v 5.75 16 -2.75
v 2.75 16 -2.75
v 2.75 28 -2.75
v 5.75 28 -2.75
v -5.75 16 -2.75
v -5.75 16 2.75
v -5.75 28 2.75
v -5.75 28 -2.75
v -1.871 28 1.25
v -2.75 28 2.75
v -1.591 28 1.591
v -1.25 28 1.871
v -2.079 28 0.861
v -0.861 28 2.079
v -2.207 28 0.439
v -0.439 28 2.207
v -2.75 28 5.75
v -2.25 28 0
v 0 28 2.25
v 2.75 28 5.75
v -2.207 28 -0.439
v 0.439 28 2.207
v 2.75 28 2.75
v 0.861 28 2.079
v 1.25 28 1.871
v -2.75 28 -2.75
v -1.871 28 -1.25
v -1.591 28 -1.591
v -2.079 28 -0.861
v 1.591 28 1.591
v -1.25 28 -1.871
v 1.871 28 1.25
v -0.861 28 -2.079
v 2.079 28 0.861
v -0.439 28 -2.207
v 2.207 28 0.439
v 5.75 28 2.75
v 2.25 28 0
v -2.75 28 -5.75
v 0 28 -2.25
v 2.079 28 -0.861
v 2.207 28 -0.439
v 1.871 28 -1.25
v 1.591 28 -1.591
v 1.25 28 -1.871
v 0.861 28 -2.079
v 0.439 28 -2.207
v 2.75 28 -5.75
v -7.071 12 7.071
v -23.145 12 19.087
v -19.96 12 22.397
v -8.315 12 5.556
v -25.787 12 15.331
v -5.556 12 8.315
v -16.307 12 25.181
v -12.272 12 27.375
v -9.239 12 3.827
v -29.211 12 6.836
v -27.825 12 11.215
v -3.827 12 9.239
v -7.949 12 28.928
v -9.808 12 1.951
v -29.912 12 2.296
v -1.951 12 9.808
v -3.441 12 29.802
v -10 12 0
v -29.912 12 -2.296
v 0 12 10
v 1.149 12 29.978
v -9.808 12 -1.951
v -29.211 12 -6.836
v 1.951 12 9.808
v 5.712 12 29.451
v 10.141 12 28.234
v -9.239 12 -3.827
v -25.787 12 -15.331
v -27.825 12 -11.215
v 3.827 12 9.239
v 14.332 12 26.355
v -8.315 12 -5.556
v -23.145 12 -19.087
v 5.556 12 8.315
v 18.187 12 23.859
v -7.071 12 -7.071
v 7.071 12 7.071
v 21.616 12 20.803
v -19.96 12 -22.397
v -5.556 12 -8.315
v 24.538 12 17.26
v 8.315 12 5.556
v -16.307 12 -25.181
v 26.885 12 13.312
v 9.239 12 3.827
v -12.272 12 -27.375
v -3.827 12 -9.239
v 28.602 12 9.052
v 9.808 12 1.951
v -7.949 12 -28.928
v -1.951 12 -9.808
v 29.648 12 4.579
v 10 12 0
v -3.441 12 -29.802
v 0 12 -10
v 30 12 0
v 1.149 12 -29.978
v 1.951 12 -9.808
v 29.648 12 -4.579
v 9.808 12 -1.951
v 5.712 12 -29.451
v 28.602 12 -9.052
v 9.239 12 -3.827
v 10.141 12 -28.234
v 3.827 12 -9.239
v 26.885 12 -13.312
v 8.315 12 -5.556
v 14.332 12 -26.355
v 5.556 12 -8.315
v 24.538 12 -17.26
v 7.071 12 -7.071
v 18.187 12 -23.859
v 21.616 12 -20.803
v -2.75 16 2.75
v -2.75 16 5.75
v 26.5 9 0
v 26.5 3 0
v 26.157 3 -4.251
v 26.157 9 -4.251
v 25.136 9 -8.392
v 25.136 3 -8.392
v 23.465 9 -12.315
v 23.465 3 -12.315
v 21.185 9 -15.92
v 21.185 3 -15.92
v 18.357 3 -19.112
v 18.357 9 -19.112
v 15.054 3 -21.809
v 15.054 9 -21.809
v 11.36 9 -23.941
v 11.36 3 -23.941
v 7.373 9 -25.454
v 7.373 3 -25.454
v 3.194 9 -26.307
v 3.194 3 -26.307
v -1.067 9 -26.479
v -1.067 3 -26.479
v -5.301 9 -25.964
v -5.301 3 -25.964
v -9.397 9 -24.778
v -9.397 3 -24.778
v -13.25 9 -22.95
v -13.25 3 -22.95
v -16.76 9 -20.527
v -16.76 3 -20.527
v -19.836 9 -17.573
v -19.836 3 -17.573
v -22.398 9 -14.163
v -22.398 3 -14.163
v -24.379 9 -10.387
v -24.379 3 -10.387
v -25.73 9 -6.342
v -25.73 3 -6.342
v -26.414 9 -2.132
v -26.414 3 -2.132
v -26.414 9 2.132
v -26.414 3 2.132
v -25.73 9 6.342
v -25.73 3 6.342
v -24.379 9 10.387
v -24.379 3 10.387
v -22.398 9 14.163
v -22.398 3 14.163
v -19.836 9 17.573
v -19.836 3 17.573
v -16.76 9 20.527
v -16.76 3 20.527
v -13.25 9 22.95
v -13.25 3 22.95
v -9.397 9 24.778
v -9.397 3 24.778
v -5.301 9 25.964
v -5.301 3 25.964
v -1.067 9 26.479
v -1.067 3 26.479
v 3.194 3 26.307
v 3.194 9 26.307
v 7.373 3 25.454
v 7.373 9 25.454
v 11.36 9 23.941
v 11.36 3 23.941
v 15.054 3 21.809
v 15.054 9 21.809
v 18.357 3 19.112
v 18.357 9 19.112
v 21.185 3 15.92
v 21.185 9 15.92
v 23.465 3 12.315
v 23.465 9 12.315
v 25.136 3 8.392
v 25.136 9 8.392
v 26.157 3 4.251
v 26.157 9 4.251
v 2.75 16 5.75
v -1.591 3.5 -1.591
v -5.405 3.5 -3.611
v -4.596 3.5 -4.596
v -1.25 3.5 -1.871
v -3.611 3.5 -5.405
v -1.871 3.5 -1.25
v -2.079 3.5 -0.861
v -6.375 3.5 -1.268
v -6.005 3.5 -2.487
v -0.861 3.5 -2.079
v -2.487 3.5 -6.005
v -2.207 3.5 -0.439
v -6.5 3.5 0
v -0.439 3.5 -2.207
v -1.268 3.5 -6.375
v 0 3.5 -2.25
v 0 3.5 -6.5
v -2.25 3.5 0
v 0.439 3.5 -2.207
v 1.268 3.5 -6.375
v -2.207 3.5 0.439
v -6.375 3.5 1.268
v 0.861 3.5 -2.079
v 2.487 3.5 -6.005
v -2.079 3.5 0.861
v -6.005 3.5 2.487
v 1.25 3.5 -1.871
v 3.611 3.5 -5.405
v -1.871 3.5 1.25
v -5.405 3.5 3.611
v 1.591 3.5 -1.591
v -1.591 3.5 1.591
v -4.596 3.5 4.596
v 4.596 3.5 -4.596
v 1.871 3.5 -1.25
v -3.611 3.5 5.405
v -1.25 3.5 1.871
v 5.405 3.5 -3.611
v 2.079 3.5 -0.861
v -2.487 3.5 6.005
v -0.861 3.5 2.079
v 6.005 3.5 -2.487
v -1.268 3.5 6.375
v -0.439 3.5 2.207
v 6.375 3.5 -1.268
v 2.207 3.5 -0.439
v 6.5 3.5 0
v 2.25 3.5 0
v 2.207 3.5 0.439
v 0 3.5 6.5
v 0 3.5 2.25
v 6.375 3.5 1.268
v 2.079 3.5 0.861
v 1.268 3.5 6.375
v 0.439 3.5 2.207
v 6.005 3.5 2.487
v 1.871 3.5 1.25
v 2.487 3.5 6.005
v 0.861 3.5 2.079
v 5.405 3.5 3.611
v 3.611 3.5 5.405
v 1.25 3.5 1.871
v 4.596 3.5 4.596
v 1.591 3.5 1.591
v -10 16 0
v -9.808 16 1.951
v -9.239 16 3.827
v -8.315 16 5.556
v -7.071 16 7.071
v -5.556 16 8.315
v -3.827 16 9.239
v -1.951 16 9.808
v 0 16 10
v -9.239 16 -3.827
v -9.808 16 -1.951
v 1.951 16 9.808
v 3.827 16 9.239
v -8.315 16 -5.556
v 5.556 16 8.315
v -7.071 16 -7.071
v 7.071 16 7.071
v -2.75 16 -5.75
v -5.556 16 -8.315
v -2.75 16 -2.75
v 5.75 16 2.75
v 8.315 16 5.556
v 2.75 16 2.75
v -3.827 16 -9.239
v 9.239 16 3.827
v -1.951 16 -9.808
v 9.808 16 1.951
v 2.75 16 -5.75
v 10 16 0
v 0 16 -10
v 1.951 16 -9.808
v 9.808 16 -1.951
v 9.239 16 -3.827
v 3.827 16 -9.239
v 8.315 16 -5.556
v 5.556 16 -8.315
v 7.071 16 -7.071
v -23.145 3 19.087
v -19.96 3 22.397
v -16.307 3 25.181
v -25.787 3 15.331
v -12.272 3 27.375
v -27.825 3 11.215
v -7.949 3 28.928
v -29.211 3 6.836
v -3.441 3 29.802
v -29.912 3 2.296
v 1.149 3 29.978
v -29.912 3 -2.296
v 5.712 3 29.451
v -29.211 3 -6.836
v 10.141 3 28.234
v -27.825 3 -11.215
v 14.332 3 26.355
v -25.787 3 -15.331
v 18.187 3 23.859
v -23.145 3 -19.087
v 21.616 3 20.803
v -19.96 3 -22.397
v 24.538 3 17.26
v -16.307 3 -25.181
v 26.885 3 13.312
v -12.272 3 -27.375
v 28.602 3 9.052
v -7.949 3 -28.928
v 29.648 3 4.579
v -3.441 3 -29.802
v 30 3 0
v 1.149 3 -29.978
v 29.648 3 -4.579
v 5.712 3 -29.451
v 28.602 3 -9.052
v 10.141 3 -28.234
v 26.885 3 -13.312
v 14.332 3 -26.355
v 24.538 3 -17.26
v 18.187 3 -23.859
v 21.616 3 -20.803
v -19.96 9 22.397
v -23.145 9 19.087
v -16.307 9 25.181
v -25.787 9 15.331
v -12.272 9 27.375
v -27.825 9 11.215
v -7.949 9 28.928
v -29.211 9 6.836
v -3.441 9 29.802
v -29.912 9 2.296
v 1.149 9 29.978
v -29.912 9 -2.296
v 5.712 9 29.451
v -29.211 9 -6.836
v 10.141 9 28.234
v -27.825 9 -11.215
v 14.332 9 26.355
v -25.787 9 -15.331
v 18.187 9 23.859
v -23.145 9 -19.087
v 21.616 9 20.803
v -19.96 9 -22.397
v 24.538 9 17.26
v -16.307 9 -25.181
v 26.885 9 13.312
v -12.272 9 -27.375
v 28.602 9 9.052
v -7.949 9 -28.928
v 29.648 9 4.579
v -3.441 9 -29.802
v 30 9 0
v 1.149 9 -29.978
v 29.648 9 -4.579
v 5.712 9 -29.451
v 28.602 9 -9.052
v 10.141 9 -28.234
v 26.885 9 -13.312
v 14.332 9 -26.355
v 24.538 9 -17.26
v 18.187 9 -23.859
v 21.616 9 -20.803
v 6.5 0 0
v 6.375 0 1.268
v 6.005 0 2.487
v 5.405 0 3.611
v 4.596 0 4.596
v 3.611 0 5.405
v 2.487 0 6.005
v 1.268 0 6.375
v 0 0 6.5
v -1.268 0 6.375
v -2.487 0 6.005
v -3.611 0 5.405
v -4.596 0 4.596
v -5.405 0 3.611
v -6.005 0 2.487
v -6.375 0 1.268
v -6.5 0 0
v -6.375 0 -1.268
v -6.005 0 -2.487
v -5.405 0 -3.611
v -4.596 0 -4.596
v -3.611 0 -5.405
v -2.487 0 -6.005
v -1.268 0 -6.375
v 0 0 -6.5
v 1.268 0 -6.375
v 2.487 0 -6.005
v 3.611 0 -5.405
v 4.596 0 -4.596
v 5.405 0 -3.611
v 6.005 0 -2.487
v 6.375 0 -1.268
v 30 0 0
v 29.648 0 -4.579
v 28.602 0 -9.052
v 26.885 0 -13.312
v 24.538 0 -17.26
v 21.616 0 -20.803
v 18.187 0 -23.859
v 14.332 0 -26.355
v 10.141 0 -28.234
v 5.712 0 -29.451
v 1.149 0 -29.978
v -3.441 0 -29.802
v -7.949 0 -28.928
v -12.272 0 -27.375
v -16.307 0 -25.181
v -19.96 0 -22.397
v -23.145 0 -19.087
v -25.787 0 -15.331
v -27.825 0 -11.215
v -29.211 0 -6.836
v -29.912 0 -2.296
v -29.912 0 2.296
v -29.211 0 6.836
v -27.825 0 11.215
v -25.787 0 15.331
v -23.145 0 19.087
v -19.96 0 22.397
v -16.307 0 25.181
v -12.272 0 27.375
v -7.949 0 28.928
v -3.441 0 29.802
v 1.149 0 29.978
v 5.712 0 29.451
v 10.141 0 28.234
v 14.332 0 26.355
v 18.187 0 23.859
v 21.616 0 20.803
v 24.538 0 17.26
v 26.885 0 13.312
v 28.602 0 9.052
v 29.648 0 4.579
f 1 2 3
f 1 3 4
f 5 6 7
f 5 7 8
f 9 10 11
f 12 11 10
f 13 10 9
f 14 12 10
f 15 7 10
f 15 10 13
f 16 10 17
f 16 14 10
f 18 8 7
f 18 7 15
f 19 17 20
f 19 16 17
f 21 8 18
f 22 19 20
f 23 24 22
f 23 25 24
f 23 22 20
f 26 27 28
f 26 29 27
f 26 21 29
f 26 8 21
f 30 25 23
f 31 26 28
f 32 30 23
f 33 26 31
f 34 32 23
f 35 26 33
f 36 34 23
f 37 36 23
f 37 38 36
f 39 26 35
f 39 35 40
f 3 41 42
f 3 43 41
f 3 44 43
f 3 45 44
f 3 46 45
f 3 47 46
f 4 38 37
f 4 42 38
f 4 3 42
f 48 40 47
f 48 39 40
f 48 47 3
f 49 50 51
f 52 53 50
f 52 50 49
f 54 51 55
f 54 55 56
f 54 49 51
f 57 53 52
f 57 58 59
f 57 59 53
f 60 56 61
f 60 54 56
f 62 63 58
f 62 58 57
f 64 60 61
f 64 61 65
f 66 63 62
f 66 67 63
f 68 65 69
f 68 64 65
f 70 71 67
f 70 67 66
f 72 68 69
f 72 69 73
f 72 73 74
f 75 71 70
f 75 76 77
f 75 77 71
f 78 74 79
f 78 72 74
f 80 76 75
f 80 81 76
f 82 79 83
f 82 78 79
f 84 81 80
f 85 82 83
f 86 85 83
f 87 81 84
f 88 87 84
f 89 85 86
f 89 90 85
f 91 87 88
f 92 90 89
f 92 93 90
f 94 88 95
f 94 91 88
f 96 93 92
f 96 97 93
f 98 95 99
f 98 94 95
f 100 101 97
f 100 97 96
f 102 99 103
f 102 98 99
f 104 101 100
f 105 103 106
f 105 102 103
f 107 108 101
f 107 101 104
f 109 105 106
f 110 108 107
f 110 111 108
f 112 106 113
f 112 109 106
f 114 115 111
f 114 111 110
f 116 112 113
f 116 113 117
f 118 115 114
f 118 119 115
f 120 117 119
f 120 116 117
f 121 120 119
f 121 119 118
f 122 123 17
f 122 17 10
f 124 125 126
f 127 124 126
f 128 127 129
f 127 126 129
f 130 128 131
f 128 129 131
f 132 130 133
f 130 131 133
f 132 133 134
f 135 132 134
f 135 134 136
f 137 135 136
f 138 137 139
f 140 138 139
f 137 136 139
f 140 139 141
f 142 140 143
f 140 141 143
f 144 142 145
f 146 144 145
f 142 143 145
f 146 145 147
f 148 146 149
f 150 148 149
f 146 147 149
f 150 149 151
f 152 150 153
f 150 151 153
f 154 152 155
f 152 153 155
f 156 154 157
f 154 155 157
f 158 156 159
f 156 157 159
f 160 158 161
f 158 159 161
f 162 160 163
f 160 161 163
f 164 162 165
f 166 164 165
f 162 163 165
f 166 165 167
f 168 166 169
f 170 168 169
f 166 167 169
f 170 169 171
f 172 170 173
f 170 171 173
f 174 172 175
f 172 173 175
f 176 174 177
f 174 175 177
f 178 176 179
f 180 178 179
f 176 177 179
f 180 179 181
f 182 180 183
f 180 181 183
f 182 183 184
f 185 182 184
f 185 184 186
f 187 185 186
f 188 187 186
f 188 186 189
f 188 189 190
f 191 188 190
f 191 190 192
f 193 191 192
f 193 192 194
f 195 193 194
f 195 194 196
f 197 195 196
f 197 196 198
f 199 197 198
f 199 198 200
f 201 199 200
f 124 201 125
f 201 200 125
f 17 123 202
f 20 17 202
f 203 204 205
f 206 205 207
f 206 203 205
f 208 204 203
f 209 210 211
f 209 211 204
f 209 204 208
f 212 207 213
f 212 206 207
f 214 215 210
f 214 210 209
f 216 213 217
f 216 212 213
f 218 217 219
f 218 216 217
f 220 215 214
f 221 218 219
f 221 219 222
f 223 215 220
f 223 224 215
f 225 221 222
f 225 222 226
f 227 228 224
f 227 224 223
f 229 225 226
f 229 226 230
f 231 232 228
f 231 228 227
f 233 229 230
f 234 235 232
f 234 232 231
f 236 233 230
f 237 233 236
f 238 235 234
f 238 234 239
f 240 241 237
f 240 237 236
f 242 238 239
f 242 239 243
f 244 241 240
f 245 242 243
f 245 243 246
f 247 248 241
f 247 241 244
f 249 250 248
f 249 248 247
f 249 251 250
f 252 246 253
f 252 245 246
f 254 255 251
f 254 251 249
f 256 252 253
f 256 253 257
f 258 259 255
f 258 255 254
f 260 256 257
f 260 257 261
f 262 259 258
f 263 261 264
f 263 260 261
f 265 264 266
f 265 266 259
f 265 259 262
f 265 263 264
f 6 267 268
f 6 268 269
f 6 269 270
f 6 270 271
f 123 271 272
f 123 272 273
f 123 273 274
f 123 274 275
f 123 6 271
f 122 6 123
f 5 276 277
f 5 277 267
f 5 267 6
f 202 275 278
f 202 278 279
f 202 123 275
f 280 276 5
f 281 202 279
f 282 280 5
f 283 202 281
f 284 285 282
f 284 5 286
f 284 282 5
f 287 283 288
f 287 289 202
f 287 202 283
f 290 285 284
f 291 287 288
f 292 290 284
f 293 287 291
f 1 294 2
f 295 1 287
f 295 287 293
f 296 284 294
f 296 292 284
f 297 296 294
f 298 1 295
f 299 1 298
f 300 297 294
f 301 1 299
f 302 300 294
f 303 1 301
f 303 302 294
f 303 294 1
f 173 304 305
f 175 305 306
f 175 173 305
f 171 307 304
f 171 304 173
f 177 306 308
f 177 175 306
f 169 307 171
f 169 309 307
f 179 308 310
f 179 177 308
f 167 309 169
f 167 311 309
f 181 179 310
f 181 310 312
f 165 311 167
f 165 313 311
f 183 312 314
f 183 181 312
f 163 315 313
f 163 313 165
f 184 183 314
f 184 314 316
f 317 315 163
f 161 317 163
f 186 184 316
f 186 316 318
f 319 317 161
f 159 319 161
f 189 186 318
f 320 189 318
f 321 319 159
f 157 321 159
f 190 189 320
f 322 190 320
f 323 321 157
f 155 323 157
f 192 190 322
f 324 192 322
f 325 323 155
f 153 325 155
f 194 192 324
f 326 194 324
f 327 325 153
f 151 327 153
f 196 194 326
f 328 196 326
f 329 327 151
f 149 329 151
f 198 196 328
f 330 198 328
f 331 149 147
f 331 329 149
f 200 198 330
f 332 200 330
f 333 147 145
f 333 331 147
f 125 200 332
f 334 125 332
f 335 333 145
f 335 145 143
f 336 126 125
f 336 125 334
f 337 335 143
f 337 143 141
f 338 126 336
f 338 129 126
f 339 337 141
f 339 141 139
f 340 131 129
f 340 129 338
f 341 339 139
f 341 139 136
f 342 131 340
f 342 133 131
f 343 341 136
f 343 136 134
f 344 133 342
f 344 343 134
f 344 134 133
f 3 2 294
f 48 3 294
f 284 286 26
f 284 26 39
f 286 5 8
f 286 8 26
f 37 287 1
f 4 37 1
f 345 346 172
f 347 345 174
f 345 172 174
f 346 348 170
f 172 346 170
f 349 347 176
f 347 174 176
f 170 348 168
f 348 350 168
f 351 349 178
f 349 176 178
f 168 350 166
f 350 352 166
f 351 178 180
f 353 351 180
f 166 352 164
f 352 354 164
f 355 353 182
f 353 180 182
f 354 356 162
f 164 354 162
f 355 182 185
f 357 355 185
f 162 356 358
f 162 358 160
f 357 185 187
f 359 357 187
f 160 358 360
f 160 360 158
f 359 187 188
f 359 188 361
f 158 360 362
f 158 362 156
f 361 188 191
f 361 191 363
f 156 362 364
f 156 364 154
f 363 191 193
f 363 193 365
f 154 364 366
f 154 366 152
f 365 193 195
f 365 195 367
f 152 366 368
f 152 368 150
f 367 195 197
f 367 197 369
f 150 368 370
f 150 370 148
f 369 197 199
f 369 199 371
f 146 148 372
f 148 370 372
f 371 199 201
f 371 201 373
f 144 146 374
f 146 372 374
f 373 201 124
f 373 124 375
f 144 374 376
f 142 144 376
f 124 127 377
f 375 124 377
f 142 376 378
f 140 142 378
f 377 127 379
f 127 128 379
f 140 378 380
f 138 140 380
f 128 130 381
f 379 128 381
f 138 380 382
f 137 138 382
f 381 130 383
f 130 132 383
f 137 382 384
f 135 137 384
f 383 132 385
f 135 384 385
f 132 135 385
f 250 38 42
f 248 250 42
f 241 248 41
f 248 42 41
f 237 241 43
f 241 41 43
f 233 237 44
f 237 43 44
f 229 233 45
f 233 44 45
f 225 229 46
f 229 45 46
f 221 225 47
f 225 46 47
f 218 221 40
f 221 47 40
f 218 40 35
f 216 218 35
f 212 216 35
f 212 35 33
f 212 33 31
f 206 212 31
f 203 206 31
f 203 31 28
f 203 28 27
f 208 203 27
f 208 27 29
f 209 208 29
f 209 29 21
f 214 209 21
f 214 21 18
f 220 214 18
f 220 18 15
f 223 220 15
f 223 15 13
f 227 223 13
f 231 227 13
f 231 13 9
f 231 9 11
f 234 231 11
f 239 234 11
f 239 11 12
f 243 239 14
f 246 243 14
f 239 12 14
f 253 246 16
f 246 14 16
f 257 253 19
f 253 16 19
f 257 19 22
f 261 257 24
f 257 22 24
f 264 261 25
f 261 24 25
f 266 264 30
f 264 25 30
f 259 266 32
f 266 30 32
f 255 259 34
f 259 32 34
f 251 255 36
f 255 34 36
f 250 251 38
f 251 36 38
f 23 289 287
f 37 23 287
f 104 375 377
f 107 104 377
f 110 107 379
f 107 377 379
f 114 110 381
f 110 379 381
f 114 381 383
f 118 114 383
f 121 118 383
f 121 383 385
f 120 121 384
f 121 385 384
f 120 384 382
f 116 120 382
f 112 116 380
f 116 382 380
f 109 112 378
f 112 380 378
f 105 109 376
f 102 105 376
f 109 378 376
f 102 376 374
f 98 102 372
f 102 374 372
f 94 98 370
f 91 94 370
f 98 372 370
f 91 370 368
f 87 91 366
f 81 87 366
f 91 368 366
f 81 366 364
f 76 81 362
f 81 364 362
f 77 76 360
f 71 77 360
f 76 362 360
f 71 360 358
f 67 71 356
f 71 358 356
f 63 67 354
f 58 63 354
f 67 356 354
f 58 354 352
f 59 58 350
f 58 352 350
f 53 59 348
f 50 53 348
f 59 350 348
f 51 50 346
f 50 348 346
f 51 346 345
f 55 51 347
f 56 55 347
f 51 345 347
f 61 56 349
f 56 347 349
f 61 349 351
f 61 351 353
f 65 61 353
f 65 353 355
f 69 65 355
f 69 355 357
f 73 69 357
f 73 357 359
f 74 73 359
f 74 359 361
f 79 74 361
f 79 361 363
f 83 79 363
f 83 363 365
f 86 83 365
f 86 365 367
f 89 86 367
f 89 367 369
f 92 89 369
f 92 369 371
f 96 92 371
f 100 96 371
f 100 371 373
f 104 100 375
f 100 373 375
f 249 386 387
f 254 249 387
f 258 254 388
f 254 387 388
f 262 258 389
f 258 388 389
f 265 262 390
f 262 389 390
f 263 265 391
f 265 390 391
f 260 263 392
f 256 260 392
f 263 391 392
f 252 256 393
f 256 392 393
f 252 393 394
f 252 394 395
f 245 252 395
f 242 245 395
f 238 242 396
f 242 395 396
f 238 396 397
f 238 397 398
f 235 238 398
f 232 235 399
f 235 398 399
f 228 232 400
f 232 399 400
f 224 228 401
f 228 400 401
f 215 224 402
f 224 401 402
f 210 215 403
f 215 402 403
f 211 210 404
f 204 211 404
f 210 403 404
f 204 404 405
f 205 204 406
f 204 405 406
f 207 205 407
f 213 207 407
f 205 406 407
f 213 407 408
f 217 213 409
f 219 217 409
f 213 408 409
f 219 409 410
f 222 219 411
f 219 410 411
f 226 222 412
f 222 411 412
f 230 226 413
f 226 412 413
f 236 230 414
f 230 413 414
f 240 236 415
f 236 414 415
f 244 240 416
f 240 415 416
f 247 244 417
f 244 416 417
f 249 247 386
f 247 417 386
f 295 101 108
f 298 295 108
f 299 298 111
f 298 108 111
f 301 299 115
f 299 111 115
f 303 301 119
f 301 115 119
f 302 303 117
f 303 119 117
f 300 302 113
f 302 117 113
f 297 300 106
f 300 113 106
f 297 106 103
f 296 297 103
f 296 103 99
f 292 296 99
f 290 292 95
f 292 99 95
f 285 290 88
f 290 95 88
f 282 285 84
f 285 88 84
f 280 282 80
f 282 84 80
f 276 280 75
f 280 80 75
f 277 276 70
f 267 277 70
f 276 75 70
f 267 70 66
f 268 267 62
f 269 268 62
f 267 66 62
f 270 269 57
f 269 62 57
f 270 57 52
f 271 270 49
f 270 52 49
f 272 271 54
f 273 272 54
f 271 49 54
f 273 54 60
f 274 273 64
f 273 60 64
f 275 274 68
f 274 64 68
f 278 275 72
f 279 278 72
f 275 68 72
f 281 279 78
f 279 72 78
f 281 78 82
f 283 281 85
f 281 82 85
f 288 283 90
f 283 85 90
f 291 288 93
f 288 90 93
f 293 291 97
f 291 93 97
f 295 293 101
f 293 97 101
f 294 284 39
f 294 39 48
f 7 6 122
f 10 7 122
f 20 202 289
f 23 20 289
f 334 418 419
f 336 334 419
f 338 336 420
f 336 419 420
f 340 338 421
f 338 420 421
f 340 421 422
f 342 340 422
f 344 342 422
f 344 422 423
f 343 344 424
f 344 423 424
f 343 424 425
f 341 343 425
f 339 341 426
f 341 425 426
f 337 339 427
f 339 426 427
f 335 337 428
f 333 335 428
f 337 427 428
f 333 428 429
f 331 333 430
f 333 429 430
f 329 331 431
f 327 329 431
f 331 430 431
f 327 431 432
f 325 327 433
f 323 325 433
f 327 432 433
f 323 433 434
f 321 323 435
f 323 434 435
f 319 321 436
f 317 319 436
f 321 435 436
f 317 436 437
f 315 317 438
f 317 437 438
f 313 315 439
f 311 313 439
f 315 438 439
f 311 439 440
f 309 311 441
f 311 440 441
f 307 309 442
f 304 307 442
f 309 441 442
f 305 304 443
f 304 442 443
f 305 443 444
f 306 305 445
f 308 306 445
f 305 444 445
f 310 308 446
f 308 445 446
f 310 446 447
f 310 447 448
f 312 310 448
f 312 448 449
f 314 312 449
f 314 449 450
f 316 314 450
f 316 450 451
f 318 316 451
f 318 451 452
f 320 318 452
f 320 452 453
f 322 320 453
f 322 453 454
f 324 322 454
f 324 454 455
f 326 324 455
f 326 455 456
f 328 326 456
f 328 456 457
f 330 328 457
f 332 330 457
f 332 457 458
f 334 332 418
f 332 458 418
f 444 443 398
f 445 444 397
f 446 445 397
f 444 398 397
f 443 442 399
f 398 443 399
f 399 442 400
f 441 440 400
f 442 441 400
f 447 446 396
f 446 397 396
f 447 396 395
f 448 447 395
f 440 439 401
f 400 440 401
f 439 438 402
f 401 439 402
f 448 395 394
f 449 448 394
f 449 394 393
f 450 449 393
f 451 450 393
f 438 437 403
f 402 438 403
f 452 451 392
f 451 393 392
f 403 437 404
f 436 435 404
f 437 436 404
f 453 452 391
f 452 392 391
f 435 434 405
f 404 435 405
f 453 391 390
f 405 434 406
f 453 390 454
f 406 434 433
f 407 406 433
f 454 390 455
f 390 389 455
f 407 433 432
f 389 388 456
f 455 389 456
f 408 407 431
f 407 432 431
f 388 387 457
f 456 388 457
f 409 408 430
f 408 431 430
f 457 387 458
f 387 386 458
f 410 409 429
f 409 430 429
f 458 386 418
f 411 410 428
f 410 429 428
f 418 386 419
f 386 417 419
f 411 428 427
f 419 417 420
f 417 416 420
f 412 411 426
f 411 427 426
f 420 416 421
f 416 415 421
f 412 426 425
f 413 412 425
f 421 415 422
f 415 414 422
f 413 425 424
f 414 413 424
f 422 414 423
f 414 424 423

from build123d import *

# Parameters (mm, degrees)
SKETCH1_R           = 30
EXTRUDE_C_DEPTH     = 3
SKETCH2_R           = 26.5
BOSS_EXTRUDE2_DEPTH = 6
SKETCH3_R           = 30
BOSS_EXTRUDE3_DEPTH = 3
SKETCH4_W           = 5.5
SKETCH4_H           = 3
SKETCH4_W_2         = 3
SKETCH4_H_2         = 5.5
BOSS_EXTRUDE4_DEPTH = 16
SKETCH5_R           = 10
BOSS_EXTRUDE5_DEPTH = 4
SKETCH7_R           = 2.25
CUT_EXTRUDE1_DEPTH  = 46
SKETCH8_R           = 6.5
CUT_EXTRUDE2_DEPTH  = 3.5


with BuildPart() as part:
    # Sketch1 → Extrude c (new body)
    with BuildSketch(Plane(origin=(0, 0, 0), x_dir=(1, 0, 0), z_dir=(0, 1, 0))):
        Circle(SKETCH1_R)
    extrude(amount=EXTRUDE_C_DEPTH)

    # Sketch2 → Boss-Extrude2 (add)
    with BuildSketch(Plane(origin=(0, 3, 0), x_dir=(1, 0, 0), z_dir=(0, 1, 0))):
        Circle(SKETCH2_R)
    extrude(amount=BOSS_EXTRUDE2_DEPTH)

    # Sketch3 → Boss-Extrude3 (add)
    with BuildSketch(Plane(origin=(0, 9, 0), x_dir=(1, 0, 0), z_dir=(0, 1, 0))):
        Circle(SKETCH3_R)
    extrude(amount=BOSS_EXTRUDE3_DEPTH)

    # Sketch4 → Boss-Extrude4 (add)
    with BuildSketch(Plane(origin=(0, 12, 0), x_dir=(1, 0, 0), z_dir=(0, 1, 0))):
        with Locations((0, 4.25)):
            Rectangle(SKETCH4_W, SKETCH4_H)
        with Locations((-4.25, 0)):
            Rectangle(SKETCH4_W_2, SKETCH4_H_2)
        Rectangle(SKETCH4_W, SKETCH4_H_2)
        with Locations((0, -4.25)):
            Rectangle(SKETCH4_W, SKETCH4_H)
        with Locations((4.25, 0)):
            Rectangle(SKETCH4_W_2, SKETCH4_H_2)
    extrude(amount=BOSS_EXTRUDE4_DEPTH)

    # Sketch5 → Boss-Extrude5 (add)
    with BuildSketch(Plane(origin=(0, 12, 0), x_dir=(1, 0, 0), z_dir=(0, 1, 0))):
        Circle(SKETCH5_R)
    extrude(amount=BOSS_EXTRUDE5_DEPTH)

    # Sketch7 → Cut-Extrude1 (cut)
    with BuildSketch(Plane(origin=(0, 28, 0), x_dir=(1, 0, 0), z_dir=(0, 1, 0))):
        Circle(SKETCH7_R)
    extrude(amount=-CUT_EXTRUDE1_DEPTH, mode=Mode.SUBTRACT)

    # Sketch8 → Cut-Extrude2 (cut)
    with BuildSketch(Plane.XZ):
        Circle(SKETCH8_R)
    extrude(amount=-CUT_EXTRUDE2_DEPTH, mode=Mode.SUBTRACT)


solid = part.part
